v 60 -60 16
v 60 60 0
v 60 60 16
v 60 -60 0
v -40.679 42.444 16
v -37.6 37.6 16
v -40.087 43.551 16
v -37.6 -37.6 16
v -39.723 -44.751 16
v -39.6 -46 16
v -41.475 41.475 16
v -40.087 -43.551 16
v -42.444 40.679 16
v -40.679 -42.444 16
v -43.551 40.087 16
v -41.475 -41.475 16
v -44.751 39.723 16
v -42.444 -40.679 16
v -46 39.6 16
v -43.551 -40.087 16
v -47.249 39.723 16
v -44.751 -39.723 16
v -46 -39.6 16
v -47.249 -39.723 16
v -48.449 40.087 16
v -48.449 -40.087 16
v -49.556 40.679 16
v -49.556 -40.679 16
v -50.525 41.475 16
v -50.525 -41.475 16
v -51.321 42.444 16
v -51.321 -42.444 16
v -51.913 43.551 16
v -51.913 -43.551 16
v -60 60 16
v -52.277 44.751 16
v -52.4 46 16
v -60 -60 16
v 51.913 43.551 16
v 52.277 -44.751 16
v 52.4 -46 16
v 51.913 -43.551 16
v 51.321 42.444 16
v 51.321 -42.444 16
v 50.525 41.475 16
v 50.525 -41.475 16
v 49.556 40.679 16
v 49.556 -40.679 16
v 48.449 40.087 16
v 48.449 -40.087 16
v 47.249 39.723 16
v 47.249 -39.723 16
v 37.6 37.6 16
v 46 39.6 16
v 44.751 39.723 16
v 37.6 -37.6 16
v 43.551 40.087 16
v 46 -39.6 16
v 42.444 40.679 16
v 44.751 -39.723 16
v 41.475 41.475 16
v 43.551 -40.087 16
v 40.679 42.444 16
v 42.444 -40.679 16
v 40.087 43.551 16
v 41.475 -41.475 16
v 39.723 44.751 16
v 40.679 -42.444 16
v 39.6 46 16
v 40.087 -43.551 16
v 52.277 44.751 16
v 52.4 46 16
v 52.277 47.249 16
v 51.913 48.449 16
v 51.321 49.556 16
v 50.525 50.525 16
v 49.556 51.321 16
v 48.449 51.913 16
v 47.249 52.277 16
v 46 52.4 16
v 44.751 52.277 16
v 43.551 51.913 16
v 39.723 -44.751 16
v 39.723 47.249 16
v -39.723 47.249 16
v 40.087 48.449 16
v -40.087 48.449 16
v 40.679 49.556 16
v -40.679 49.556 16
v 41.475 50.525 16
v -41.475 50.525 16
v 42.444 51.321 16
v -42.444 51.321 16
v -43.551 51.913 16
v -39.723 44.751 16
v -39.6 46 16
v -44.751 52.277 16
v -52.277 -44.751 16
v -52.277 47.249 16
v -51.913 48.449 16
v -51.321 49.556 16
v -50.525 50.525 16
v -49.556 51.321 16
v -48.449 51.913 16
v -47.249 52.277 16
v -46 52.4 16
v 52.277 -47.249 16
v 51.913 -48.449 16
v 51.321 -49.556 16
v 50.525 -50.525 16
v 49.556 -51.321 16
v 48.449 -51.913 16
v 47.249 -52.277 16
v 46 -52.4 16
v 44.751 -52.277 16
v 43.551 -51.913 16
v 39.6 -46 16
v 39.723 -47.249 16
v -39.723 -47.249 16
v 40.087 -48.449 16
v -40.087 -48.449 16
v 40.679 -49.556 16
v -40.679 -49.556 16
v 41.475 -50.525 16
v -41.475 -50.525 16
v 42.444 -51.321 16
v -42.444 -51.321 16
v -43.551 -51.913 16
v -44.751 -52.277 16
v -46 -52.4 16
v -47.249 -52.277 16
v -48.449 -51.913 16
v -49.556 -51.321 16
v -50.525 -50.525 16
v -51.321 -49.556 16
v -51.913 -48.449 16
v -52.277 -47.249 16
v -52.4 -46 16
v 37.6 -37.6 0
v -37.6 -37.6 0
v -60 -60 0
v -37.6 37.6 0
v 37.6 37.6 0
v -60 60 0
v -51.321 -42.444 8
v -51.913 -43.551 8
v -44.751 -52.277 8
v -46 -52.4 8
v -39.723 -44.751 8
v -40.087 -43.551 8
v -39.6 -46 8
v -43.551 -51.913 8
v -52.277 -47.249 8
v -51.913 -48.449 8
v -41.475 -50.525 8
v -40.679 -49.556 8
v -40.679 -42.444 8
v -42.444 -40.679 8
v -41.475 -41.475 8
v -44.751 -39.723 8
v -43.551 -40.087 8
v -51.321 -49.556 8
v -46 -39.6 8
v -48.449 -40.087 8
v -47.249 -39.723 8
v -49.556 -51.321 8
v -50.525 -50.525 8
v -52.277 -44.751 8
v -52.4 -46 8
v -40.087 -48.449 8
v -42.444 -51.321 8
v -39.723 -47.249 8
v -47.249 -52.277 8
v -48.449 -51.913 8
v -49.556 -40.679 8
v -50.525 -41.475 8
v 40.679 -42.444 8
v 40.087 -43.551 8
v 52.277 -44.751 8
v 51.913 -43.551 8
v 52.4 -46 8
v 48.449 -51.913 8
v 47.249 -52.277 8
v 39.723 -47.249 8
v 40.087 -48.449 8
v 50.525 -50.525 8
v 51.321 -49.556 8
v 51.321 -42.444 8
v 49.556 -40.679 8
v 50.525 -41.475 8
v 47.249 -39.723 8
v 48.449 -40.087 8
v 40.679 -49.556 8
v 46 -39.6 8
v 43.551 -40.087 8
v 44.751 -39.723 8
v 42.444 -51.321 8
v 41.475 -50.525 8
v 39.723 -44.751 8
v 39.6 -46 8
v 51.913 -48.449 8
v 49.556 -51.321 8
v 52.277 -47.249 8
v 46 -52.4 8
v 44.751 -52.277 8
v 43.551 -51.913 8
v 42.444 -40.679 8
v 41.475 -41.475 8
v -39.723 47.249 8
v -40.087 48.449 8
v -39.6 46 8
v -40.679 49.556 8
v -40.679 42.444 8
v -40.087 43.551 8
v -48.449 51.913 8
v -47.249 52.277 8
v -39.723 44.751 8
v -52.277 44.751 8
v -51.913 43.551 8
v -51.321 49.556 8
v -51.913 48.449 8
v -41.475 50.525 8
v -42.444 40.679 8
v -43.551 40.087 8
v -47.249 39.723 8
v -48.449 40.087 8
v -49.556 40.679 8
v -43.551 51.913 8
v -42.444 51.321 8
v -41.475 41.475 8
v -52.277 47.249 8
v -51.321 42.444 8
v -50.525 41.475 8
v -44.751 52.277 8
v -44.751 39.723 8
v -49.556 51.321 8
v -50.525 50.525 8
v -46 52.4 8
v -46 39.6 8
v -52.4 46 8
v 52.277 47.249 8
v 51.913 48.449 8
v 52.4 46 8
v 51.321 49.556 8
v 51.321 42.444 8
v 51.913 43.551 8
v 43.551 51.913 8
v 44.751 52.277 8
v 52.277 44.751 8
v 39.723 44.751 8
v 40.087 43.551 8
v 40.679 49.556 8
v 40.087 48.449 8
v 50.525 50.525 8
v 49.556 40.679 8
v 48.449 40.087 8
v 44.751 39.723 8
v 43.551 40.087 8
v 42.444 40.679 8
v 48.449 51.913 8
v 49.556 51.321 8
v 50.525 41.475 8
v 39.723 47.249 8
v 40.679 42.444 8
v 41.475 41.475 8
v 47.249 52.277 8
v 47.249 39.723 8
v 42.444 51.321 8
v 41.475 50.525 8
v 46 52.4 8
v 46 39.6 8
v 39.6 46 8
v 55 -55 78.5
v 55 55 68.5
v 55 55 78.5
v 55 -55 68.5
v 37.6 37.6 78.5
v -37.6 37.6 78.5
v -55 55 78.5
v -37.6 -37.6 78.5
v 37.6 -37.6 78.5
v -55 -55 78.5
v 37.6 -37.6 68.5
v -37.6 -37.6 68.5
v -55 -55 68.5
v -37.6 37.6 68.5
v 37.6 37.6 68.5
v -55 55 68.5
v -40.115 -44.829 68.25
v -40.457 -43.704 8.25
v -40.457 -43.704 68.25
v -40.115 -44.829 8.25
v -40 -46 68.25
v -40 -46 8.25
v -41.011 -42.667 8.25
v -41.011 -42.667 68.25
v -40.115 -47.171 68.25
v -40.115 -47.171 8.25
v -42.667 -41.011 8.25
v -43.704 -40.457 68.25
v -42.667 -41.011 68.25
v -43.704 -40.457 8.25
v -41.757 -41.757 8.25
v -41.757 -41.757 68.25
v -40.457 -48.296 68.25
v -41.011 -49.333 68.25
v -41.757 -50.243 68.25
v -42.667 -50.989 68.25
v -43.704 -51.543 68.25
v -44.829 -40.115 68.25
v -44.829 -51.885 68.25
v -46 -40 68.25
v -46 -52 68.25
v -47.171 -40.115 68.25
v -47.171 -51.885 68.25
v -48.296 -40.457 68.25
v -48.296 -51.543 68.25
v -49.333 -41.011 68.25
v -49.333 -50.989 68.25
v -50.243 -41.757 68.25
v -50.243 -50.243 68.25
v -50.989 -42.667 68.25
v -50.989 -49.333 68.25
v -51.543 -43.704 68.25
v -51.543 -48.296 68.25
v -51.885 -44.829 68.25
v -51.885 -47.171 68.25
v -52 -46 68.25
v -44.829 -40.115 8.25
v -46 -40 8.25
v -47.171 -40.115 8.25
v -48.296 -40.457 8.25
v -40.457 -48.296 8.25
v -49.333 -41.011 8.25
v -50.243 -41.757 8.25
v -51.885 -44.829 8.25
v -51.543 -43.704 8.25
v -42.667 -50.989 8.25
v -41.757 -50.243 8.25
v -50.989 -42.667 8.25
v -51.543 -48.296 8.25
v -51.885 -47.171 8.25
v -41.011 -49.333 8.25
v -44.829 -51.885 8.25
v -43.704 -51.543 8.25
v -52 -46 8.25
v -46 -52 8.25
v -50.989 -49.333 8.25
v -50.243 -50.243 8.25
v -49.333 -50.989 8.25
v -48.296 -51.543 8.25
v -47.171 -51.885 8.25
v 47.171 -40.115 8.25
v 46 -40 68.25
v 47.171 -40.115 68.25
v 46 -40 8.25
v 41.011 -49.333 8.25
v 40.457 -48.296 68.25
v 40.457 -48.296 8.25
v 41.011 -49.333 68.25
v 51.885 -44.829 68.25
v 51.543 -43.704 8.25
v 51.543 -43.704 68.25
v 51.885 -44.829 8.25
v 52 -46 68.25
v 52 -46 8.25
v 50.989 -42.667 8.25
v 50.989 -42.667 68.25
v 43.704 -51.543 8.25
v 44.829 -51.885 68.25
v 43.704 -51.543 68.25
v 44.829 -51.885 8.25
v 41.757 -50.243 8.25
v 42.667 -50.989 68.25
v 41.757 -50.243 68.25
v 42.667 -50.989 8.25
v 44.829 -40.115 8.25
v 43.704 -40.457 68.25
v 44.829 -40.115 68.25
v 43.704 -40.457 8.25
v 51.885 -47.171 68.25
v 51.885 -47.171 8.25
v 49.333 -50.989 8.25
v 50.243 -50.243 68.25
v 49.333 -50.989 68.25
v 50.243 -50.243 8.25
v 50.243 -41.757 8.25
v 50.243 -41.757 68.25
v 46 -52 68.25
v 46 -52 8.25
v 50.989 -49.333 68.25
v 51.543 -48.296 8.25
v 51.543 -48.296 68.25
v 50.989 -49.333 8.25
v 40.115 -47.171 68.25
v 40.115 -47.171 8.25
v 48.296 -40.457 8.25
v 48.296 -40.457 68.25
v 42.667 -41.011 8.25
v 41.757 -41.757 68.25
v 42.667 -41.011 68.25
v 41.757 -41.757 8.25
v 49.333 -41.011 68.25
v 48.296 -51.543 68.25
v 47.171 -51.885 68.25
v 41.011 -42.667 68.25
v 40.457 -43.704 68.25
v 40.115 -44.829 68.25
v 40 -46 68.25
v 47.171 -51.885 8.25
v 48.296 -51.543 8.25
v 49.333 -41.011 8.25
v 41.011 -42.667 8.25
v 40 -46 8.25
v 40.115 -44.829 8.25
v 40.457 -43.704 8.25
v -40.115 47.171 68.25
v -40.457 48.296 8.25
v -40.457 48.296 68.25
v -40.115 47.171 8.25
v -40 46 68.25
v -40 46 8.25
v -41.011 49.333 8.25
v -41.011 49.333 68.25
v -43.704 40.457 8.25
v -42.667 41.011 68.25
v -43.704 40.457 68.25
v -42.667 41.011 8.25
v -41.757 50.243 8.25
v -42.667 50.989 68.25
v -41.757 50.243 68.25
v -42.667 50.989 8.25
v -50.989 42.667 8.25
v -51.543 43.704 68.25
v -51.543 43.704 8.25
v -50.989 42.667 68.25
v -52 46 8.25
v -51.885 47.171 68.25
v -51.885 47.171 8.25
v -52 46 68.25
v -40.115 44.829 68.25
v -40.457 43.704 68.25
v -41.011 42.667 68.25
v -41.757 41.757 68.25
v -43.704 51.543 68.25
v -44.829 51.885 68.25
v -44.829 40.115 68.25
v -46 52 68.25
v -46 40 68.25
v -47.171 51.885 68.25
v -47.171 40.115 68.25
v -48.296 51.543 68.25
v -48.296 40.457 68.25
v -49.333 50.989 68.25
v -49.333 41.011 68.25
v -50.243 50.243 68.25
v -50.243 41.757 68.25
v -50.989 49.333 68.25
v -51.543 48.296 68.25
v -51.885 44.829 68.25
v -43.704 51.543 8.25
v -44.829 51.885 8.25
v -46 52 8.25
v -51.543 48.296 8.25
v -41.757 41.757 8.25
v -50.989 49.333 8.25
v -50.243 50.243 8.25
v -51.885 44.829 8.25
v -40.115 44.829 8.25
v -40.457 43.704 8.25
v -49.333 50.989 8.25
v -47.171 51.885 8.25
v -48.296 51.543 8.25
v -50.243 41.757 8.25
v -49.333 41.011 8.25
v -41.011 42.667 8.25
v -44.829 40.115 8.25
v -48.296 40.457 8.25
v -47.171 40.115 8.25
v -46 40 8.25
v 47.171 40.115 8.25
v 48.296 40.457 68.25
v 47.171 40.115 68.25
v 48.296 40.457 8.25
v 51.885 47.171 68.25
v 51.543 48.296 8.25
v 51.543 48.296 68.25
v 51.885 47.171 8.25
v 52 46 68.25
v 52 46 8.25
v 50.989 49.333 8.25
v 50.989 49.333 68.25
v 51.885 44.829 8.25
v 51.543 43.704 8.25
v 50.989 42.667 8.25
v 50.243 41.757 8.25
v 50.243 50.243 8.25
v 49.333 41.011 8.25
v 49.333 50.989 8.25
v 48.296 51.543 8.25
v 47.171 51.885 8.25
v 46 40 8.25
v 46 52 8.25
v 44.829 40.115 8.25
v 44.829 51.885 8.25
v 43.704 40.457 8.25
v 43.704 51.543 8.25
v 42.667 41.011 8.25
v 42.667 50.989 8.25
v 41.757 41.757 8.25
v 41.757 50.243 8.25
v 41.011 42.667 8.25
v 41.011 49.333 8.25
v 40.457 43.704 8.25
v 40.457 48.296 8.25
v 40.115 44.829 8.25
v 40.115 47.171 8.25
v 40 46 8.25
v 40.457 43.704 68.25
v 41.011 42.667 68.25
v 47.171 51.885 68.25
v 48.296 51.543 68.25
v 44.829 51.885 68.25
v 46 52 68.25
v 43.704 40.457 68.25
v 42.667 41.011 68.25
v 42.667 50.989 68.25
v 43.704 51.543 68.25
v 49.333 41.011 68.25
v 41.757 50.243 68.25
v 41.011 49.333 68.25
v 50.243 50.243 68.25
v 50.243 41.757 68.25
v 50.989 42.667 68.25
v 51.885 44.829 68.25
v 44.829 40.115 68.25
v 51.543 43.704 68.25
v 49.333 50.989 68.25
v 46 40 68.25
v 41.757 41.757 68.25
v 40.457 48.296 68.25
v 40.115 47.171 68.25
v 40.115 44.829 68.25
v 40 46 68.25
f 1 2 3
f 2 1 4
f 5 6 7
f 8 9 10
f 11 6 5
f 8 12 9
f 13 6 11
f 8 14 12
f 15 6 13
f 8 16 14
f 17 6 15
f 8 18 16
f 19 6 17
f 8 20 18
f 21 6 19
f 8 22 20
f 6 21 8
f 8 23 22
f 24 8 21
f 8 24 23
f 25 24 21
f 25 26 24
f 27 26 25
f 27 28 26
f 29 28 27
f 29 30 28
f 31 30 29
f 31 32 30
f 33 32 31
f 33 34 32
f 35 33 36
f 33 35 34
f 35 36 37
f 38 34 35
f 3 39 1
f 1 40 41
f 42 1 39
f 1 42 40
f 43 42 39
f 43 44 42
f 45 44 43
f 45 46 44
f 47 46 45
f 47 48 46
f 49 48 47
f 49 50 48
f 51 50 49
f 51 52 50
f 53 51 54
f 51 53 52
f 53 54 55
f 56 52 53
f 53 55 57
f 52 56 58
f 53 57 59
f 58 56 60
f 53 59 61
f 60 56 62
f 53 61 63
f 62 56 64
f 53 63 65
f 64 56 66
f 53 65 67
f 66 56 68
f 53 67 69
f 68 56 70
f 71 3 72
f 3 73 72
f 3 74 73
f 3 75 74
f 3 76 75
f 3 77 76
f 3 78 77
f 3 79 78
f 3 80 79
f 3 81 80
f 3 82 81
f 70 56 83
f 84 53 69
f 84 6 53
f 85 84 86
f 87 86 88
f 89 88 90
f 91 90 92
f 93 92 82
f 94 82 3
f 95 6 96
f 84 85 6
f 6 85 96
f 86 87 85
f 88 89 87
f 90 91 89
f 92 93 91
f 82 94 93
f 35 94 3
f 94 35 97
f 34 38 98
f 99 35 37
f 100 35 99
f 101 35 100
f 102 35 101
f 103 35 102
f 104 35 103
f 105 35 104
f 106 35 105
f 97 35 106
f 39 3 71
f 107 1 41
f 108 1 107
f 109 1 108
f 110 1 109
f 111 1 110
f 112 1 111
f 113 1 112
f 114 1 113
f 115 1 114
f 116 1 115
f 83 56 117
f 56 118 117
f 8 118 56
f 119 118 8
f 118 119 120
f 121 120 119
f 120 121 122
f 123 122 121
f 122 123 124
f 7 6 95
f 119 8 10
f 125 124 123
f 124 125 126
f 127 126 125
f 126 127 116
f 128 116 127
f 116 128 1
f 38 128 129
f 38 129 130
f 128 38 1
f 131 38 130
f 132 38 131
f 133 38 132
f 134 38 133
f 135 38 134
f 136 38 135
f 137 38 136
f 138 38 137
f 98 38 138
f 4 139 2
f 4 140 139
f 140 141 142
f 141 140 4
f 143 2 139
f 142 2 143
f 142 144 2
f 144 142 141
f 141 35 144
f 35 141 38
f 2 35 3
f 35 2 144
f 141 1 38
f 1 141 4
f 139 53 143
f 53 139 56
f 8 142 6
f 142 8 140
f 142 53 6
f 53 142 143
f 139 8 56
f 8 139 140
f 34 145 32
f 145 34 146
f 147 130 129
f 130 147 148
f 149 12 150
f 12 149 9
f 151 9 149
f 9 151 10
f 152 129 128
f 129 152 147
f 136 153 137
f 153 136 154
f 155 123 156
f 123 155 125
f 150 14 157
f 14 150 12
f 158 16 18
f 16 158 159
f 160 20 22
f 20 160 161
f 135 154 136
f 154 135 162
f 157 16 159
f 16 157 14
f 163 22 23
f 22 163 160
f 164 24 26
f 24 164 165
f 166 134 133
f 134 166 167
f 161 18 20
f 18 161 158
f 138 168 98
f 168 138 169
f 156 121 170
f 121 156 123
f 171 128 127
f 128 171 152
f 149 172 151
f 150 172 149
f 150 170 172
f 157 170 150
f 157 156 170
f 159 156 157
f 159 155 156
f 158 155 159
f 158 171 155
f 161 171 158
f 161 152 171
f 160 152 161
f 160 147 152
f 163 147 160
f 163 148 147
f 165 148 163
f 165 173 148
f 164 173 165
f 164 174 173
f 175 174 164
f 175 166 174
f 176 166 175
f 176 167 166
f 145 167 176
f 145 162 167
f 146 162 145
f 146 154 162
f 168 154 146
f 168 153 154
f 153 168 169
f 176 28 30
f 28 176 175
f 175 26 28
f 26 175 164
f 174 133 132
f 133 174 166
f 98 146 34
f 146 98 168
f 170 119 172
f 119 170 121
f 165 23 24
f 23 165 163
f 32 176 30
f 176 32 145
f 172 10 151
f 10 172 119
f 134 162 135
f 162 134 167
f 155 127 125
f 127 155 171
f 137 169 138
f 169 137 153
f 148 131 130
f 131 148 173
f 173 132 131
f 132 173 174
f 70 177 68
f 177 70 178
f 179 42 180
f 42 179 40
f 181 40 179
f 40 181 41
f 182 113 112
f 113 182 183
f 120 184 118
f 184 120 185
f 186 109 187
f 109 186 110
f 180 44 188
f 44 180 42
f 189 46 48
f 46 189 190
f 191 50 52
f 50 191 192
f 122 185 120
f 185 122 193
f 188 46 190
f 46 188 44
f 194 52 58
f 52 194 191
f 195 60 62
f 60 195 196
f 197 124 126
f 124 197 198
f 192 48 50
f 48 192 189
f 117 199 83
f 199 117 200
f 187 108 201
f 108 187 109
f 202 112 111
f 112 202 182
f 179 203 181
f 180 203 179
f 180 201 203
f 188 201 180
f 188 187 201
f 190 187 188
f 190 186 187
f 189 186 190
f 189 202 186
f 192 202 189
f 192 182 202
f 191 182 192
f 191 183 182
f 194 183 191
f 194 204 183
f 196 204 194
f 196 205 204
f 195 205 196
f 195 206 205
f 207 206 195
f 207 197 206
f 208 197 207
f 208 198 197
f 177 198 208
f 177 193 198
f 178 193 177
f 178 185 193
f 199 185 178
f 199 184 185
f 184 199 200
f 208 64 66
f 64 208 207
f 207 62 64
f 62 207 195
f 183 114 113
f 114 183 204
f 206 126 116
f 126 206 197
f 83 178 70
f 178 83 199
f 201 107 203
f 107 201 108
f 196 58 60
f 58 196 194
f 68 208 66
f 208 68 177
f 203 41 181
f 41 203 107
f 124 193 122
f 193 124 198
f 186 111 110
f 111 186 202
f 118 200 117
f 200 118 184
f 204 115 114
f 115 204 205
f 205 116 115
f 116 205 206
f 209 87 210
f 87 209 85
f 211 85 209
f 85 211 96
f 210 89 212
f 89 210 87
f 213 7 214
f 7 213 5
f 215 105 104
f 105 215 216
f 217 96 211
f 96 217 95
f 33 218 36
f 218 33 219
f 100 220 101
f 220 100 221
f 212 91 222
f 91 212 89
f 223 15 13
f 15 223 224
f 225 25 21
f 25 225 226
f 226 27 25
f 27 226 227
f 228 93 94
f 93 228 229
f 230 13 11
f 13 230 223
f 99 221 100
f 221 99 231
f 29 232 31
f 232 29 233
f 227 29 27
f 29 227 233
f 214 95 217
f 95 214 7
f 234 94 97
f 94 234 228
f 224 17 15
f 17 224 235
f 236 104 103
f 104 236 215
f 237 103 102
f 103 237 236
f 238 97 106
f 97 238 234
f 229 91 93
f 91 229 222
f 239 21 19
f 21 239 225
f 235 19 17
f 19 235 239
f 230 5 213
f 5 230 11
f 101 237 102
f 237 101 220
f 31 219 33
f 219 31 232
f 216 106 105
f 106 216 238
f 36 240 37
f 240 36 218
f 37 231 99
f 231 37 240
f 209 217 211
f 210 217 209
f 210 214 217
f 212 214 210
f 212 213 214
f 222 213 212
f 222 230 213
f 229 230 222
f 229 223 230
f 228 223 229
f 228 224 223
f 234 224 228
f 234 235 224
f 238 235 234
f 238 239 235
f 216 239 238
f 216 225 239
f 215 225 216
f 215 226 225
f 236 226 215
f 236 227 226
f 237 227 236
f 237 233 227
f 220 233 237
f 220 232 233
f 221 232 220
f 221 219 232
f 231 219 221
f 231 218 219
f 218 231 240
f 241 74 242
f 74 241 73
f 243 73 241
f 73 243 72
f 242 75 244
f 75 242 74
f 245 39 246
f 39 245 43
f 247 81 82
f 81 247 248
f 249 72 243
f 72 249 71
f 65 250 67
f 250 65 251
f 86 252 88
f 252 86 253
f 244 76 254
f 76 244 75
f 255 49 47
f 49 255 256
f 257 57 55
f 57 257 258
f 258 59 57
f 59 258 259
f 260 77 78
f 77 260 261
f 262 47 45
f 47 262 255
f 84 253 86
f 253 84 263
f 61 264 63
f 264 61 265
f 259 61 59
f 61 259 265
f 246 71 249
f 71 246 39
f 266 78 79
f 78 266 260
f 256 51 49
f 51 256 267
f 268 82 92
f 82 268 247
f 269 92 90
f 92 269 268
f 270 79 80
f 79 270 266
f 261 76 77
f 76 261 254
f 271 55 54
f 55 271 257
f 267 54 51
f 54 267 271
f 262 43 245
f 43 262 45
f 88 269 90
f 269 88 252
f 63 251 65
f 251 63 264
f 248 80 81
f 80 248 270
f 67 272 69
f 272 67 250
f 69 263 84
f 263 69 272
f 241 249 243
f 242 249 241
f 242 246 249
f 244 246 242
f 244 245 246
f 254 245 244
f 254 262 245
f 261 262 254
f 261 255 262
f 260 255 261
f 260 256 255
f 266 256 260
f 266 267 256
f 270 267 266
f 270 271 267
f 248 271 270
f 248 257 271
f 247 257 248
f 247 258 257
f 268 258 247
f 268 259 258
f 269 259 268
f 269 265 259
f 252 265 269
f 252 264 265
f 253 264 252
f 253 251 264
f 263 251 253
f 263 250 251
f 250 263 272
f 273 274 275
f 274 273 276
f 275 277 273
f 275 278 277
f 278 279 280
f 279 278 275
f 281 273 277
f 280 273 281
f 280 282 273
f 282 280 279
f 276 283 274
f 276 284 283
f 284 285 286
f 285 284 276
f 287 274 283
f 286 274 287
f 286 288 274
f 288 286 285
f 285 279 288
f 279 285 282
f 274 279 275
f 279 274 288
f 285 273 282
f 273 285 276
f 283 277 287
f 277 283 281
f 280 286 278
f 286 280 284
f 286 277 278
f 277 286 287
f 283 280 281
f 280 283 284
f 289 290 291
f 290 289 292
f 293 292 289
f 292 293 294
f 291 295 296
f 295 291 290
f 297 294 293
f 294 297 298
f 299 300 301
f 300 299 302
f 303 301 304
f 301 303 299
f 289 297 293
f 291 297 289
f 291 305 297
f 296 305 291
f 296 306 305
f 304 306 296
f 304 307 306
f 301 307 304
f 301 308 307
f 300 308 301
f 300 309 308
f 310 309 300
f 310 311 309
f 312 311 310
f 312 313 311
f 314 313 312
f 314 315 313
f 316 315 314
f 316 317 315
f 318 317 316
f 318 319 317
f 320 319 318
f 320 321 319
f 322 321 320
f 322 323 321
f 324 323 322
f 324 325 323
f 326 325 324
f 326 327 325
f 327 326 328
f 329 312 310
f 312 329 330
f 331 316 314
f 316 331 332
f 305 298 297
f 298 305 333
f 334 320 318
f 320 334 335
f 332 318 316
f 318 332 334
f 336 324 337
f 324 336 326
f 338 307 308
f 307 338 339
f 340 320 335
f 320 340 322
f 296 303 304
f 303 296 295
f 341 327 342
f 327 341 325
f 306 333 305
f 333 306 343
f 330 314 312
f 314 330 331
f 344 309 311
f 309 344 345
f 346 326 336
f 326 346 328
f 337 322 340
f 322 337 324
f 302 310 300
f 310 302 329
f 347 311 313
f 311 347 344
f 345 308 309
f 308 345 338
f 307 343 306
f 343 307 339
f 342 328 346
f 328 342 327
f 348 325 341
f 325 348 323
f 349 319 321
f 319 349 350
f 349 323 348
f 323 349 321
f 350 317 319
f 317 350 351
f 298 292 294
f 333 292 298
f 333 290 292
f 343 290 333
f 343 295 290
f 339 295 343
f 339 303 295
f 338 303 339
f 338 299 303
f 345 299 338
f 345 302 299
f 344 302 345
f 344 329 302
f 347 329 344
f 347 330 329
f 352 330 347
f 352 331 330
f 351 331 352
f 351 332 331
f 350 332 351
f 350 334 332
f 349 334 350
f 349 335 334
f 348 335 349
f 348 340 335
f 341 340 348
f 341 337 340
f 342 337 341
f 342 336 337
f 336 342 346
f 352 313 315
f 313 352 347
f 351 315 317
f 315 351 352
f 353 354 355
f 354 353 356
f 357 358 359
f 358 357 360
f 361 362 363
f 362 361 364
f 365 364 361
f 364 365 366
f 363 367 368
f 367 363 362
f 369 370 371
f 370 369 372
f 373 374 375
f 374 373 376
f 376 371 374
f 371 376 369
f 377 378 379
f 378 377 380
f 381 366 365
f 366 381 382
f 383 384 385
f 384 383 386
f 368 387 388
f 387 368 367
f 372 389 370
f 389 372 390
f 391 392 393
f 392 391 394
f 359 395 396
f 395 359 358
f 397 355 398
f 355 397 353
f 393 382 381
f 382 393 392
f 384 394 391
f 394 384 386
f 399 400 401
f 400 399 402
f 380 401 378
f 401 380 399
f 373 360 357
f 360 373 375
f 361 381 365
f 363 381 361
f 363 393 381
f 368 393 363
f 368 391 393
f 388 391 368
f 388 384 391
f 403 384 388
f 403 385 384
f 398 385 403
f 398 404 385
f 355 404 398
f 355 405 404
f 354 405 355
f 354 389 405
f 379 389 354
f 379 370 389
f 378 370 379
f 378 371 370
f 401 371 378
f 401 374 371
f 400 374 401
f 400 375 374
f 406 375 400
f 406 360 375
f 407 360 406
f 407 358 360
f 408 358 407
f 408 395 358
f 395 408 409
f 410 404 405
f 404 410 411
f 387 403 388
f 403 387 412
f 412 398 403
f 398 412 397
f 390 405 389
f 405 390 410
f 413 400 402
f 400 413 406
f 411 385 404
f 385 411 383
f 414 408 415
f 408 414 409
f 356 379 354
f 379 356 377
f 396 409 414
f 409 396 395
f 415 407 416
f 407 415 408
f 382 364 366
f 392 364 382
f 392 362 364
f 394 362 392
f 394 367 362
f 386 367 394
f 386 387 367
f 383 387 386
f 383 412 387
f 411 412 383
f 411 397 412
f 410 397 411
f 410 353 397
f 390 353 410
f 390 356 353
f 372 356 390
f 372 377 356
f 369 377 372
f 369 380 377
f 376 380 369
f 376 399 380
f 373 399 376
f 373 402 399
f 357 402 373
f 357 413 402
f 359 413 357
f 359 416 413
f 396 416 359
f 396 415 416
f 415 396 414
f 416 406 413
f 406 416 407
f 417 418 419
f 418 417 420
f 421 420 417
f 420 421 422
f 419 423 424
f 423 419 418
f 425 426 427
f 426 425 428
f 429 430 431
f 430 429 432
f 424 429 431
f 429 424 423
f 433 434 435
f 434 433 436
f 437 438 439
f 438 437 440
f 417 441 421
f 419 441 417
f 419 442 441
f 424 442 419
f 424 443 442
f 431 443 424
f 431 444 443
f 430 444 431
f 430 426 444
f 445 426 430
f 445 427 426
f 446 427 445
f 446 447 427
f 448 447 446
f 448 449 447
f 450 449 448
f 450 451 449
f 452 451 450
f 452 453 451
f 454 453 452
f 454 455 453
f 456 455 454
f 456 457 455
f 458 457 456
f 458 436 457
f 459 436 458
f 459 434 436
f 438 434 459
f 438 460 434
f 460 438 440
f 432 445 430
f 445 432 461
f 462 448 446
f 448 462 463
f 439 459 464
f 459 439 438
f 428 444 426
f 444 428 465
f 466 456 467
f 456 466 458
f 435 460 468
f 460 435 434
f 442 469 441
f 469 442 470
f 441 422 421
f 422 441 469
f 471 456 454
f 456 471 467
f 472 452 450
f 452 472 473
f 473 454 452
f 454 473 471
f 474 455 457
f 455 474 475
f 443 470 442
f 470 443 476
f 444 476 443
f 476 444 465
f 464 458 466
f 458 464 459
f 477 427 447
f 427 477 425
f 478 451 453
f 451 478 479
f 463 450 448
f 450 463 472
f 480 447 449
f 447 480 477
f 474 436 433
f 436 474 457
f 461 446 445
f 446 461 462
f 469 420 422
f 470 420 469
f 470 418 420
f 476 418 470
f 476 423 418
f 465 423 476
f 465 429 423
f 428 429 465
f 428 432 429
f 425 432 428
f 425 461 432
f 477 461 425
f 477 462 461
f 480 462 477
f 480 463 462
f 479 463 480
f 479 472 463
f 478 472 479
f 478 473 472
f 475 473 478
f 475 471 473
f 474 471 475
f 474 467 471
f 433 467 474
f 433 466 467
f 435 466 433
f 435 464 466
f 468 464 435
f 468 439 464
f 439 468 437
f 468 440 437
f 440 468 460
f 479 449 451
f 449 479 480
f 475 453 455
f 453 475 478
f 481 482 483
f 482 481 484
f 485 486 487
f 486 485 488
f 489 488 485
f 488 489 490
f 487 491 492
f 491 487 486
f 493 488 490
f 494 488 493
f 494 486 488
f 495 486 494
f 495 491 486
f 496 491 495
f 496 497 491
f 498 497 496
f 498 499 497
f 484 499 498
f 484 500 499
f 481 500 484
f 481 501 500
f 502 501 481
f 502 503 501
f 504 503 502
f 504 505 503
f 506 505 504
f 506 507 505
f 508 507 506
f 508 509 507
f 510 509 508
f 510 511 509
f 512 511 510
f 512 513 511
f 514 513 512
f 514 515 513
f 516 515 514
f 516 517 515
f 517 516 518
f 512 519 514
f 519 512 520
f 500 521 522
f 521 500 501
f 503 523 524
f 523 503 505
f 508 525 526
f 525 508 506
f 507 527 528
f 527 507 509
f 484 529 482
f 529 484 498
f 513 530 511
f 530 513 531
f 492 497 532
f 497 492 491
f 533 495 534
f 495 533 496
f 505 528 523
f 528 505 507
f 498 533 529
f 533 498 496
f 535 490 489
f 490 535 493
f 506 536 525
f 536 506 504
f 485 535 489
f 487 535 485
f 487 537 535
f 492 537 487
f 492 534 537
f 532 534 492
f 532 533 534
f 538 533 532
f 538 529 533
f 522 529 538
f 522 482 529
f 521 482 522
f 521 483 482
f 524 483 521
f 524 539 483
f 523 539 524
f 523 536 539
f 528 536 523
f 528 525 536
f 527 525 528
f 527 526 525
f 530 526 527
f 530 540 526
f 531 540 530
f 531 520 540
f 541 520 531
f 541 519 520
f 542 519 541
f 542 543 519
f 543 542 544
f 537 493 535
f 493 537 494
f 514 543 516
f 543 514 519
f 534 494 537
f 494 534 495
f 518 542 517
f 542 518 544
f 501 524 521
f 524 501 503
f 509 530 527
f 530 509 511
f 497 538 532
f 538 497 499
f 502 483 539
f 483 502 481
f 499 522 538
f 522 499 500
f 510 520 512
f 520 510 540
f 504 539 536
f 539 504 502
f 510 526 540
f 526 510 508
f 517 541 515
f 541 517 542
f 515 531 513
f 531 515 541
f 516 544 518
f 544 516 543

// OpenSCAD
$fn = 32;

// ------------------------------------------------------------------------
// Frame cube: base 120 x 120 mm, posts 60 mm tall
// Every part is its own module, assembly() places every instance.
// ------------------------------------------------------------------------

// --- part 1 ---
module base_frame() {
  difference() {
    translate([-60, -60, 0]) cube([120, 120, 16]);
    translate([-37.6, -37.6, -1]) cube([75.2, 75.2, 18]);
    translate([-46, -46, 8]) cylinder(h = 9, d = 12.8);
    translate([46, -46, 8]) cylinder(h = 9, d = 12.8);
    translate([-46, 46, 8]) cylinder(h = 9, d = 12.8);
    translate([46, 46, 8]) cylinder(h = 9, d = 12.8);
  }
}

// --- part 2 ---
module corner_post() {
  cylinder(h = 60, d = 12);
}

// --- part 3 ---
module top_frame() {
  difference() {
    translate([-55, -55, 0]) cube([110, 110, 10]);
    translate([-37.6, -37.6, -1]) cube([75.2, 75.2, 12]);
  }
}

// --- assembly ---
module assembly() {
  color([0.80, 0.24, 0.20]) translate([0, 0, 0]) rotate([0, 0, 0]) base_frame();
  color([0.20, 0.45, 0.75]) translate([-46, -46, 8.25]) rotate([0, 0, 0]) corner_post();
  color([0.25, 0.62, 0.32]) translate([46, -46, 8.25]) rotate([0, 0, 0]) corner_post();
  color([0.92, 0.70, 0.18]) translate([-46, 46, 8.25]) rotate([0, 0, 0]) corner_post();
  color([0.58, 0.35, 0.70]) translate([46, 46, 8.25]) rotate([0, 0, 0]) corner_post();
  color([0.16, 0.66, 0.66]) translate([0, 0, 68.5]) rotate([0, 0, 0]) top_frame();
}

assembly();
